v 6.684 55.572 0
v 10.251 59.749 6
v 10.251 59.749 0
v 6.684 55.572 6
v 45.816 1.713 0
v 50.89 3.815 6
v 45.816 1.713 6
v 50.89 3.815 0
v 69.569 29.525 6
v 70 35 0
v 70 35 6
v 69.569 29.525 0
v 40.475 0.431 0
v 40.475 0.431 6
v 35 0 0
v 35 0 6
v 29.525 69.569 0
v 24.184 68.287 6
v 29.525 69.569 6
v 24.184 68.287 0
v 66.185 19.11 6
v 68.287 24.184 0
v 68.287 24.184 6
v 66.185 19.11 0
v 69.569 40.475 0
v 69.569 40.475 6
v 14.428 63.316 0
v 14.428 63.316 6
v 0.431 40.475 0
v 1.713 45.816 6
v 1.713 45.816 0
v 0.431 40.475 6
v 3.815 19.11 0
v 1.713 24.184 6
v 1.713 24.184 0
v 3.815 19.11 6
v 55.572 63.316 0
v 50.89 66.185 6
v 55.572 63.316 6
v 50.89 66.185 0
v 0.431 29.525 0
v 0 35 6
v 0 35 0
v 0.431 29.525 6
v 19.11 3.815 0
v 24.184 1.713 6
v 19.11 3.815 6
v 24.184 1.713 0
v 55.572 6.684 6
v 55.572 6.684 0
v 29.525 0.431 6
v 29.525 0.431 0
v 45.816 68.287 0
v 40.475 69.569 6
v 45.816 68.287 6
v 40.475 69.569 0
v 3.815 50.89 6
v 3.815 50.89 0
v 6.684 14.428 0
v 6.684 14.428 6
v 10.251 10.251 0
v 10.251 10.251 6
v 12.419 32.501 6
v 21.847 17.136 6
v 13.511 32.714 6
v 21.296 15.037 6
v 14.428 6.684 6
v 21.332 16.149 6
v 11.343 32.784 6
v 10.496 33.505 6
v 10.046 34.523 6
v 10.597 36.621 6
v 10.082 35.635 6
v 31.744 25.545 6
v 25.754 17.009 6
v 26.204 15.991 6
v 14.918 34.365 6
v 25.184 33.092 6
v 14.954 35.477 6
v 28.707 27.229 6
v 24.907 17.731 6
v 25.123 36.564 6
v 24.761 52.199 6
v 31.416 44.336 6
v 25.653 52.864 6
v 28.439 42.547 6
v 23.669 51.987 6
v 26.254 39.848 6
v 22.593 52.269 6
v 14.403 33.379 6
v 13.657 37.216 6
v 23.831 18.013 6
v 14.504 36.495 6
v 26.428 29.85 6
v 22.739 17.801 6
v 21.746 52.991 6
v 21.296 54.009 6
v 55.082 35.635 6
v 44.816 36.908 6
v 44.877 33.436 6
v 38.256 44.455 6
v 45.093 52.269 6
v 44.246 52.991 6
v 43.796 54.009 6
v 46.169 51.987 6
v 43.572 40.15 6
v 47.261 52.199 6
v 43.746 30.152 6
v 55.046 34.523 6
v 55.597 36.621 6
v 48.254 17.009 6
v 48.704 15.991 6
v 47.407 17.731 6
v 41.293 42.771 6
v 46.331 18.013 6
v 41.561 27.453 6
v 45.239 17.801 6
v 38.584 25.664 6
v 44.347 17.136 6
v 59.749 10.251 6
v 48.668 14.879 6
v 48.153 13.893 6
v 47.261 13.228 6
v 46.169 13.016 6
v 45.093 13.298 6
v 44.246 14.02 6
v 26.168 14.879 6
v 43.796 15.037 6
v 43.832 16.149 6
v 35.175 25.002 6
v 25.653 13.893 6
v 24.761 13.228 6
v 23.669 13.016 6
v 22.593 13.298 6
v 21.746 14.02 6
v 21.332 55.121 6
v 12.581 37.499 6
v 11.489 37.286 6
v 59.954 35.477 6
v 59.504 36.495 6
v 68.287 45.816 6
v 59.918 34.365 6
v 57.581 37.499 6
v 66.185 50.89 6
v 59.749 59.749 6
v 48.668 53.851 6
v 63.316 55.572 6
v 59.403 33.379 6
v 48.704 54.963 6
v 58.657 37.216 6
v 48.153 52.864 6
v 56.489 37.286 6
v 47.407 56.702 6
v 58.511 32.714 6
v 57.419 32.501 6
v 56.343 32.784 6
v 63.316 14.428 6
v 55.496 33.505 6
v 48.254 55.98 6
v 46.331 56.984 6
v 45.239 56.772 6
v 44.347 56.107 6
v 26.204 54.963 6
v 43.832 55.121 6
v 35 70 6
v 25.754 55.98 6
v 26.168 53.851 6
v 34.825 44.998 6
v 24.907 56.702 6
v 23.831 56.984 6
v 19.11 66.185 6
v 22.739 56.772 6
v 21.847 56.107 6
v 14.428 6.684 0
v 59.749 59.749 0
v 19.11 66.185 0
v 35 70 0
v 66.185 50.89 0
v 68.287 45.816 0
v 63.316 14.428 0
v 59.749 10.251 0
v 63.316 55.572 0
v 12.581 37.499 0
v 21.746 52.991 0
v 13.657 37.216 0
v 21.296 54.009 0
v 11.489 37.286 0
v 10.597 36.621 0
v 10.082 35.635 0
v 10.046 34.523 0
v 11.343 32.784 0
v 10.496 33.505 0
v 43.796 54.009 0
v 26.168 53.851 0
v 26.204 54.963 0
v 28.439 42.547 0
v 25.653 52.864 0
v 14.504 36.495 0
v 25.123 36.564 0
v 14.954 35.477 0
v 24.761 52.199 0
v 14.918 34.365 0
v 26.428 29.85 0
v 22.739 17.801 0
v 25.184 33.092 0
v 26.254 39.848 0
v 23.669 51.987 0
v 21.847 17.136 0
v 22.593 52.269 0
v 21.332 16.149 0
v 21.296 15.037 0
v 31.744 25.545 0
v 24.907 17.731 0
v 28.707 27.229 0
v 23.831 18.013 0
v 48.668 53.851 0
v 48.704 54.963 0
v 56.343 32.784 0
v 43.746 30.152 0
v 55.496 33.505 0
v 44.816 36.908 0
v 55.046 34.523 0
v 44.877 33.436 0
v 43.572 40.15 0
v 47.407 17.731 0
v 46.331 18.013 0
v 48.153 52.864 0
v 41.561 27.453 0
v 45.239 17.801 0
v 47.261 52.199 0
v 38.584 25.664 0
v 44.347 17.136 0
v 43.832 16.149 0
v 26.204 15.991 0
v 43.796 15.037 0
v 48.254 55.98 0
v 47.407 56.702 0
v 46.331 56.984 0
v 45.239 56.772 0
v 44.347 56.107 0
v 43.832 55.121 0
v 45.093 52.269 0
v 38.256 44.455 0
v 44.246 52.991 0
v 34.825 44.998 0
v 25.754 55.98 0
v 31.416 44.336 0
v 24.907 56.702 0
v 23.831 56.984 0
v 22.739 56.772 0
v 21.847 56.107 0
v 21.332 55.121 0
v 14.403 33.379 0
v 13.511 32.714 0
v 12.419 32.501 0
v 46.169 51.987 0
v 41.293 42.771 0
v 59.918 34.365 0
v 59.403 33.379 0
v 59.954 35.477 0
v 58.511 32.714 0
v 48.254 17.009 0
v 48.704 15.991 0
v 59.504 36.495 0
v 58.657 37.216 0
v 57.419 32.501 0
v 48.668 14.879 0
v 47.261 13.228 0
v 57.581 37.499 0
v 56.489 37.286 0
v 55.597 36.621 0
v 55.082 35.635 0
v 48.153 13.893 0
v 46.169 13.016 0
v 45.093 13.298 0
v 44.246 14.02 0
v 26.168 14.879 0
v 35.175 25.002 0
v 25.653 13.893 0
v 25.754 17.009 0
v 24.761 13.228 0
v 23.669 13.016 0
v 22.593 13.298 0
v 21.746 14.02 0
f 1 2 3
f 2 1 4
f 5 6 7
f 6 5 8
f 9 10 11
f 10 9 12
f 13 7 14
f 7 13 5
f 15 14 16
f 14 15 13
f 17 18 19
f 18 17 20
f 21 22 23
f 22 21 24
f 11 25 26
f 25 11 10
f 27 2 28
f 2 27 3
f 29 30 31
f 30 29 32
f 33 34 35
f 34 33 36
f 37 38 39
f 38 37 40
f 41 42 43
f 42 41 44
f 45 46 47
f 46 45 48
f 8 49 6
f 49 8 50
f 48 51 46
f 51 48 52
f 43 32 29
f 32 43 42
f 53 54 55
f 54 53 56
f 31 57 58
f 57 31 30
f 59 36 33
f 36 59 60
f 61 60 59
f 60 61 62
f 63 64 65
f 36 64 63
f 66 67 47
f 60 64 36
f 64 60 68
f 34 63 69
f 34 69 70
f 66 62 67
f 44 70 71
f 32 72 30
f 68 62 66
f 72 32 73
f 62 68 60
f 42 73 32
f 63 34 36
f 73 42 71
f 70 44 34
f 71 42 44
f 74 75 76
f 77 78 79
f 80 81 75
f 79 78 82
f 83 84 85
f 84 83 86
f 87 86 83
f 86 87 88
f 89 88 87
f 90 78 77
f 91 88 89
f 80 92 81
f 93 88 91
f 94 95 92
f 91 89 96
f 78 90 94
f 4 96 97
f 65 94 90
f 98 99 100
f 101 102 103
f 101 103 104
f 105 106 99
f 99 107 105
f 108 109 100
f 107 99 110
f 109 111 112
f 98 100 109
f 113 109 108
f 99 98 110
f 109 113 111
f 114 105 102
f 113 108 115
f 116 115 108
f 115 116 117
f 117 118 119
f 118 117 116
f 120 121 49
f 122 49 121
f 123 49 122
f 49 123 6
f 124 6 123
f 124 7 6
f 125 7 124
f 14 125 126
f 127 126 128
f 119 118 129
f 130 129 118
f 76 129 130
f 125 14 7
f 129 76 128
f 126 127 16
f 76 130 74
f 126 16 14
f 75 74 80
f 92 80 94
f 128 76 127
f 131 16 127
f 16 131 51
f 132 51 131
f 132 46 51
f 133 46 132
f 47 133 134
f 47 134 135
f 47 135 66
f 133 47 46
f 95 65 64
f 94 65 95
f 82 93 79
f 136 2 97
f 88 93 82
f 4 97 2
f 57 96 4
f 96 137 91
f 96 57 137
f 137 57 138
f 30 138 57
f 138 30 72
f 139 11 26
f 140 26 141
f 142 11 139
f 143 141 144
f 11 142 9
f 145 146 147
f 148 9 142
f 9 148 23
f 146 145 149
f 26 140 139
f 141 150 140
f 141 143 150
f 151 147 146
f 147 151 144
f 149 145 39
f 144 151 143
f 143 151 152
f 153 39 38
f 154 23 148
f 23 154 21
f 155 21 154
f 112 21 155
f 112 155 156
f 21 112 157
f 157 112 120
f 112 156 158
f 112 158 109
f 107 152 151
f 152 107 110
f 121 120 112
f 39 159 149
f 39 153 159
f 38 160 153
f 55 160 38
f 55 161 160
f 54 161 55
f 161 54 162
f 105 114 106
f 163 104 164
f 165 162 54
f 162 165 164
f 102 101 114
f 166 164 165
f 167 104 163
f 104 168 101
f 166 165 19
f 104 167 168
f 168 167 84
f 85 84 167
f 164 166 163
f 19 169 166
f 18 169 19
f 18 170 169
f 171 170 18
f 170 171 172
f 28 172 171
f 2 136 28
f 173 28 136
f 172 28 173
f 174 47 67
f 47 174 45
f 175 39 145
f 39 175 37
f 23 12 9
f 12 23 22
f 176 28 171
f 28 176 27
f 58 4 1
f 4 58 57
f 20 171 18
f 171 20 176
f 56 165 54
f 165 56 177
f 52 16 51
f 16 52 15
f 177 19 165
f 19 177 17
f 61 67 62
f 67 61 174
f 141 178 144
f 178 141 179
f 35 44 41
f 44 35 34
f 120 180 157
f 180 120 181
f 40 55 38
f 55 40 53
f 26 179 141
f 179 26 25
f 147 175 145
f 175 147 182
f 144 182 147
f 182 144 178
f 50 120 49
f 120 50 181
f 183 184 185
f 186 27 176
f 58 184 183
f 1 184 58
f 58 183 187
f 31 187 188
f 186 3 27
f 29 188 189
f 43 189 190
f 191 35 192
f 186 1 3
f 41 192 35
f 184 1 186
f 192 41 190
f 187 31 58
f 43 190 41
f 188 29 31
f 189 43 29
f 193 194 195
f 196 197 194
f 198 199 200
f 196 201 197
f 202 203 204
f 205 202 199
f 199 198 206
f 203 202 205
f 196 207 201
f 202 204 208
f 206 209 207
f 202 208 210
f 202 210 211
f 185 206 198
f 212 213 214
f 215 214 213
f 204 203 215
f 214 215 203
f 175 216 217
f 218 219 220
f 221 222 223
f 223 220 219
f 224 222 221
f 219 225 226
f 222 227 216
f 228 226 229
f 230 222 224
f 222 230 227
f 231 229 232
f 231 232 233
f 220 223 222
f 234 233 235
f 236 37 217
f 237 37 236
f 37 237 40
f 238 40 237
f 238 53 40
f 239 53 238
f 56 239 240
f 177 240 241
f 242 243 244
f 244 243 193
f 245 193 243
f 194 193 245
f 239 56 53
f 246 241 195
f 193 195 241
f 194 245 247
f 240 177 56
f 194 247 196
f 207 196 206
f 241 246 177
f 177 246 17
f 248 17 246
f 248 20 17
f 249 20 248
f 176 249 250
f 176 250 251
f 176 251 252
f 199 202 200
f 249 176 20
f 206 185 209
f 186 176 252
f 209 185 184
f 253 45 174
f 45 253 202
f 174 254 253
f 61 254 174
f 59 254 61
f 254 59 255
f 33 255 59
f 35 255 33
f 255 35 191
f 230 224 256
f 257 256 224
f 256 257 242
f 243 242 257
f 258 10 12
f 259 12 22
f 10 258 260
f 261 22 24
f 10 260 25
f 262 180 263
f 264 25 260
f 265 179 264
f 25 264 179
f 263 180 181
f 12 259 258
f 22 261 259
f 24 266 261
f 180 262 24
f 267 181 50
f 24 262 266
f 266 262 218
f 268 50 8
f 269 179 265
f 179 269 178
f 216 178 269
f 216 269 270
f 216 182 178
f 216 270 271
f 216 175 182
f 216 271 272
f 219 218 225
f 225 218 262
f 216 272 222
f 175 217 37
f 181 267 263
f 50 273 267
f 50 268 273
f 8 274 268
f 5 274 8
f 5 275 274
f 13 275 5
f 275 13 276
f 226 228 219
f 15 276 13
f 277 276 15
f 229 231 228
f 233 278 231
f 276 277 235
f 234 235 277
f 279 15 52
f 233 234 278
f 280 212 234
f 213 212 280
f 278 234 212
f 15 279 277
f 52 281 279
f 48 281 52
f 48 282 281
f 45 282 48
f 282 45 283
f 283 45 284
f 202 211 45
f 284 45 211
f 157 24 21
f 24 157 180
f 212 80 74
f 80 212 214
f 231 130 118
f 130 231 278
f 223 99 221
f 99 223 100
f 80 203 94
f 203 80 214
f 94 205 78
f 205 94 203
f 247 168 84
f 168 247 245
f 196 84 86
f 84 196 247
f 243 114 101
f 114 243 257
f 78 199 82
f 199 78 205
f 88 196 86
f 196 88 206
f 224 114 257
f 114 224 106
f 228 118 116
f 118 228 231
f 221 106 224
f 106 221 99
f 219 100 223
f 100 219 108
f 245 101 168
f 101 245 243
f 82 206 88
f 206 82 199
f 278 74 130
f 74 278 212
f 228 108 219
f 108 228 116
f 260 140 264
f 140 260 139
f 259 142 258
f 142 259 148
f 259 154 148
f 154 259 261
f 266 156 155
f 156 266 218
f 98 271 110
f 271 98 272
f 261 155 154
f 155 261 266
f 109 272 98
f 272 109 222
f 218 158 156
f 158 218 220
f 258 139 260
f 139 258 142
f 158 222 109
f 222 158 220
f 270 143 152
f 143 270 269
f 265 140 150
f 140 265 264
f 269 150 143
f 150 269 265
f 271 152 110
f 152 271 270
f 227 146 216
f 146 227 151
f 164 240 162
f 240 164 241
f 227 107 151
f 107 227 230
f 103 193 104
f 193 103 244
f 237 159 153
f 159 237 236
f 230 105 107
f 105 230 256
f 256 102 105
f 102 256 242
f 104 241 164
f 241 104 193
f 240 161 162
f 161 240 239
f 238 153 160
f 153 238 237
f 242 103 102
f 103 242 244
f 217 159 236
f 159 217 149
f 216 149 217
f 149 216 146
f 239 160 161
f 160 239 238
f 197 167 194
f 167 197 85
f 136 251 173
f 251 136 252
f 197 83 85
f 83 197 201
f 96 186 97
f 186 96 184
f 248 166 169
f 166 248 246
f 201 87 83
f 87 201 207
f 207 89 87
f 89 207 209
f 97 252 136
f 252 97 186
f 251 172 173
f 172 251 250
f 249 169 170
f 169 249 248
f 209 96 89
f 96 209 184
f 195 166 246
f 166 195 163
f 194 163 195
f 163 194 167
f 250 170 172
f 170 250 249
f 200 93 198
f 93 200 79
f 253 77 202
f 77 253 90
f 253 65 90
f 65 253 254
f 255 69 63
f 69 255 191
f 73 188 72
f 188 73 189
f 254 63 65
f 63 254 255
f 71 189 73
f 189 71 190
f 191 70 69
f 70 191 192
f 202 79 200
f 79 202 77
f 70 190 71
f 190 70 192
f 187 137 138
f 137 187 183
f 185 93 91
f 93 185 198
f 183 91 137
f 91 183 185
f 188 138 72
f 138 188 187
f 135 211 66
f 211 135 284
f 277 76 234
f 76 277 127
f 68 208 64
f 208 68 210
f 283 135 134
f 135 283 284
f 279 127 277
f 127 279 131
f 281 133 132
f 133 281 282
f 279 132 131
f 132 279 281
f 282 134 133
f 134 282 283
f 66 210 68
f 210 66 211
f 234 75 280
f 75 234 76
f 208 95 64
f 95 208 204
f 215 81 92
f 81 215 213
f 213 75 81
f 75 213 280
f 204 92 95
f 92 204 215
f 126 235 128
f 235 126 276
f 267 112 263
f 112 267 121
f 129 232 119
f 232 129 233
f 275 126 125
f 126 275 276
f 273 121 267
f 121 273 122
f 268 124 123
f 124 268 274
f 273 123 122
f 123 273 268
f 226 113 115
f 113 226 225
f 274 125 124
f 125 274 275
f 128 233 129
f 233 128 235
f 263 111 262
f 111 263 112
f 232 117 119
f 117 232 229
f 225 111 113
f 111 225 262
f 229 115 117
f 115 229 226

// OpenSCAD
$fn = 32;

// ----------------------------------------------------------------------
// Spacer plate: round flange R35, 6 bolts
// ----------------------------------------------------------------------

// --- parameters (mm) ---
bore_r = 10;              // centre bore radius
bolt_r = 2.5;             // bolt hole radius
plate_t = 6;              // plate thickness, Z (extrusion height)
flange_r = 35;            // flange radius
n_bolt = 6;               // bolt hole count
ring_r = 22.5;            // bolt circle radius

profile = [[70, 35], [69.569, 40.475], [68.287, 45.816], [66.185, 50.89], [63.316, 55.572], [59.749, 59.749], [55.572, 63.316], [50.89, 66.185], [45.816, 68.287], [40.475, 69.569], [35, 70], [29.525, 69.569], [24.184, 68.287], [19.11, 66.185], [14.428, 63.316], [10.251, 59.749], [6.684, 55.572], [3.815, 50.89], [1.713, 45.816], [0.431, 40.475], [0, 35], [0.431, 29.525], [1.713, 24.184], [3.815, 19.11], [6.684, 14.428], [10.251, 10.251], [14.428, 6.684], [19.11, 3.815], [24.184, 1.713], [29.525, 0.431], [35, 0], [40.475, 0.431], [45.816, 1.713], [50.89, 3.815], [55.572, 6.684], [59.749, 10.251], [63.316, 14.428], [66.185, 19.11], [68.287, 24.184], [69.569, 29.525]];  // primary outline, 40 points, counter clockwise
void_1 = [[44.816, 36.908], [43.572, 40.15], [41.293, 42.771], [38.256, 44.455], [34.825, 44.998], [31.416, 44.336], [28.439, 42.547], [26.254, 39.848], [25.123, 36.564], [25.184, 33.092], [26.428, 29.85], [28.707, 27.229], [31.744, 25.545], [35.175, 25.002], [38.584, 25.664], [41.561, 27.453], [43.746, 30.152], [44.877, 33.436]];  // centre bore, 18 points
void_2 = [[59.954, 35.477], [59.504, 36.495], [58.657, 37.216], [57.581, 37.499], [56.489, 37.286], [55.597, 36.621], [55.082, 35.635], [55.046, 34.523], [55.496, 33.505], [56.343, 32.784], [57.419, 32.501], [58.511, 32.714], [59.403, 33.379], [59.918, 34.365]];  // bolt hole 1, 14 points
void_3 = [[48.704, 54.963], [48.254, 55.98], [47.407, 56.702], [46.331, 56.984], [45.239, 56.772], [44.347, 56.107], [43.832, 55.121], [43.796, 54.009], [44.246, 52.991], [45.093, 52.269], [46.169, 51.987], [47.261, 52.199], [48.153, 52.864], [48.668, 53.851]];  // bolt hole 2, 14 points
void_4 = [[26.204, 54.963], [25.754, 55.98], [24.907, 56.702], [23.831, 56.984], [22.739, 56.772], [21.847, 56.107], [21.332, 55.121], [21.296, 54.009], [21.746, 52.991], [22.593, 52.269], [23.669, 51.987], [24.761, 52.199], [25.653, 52.864], [26.168, 53.851]];  // bolt hole 3, 14 points
void_5 = [[14.954, 35.477], [14.504, 36.495], [13.657, 37.216], [12.581, 37.499], [11.489, 37.286], [10.597, 36.621], [10.082, 35.635], [10.046, 34.523], [10.496, 33.505], [11.343, 32.784], [12.419, 32.501], [13.511, 32.714], [14.403, 33.379], [14.918, 34.365]];  // bolt hole 4, 14 points
void_6 = [[26.204, 15.991], [25.754, 17.009], [24.907, 17.731], [23.831, 18.013], [22.739, 17.801], [21.847, 17.136], [21.332, 16.149], [21.296, 15.037], [21.746, 14.02], [22.593, 13.298], [23.669, 13.016], [24.761, 13.228], [25.653, 13.893], [26.168, 14.879]];  // bolt hole 5, 14 points
void_7 = [[48.704, 15.991], [48.254, 17.009], [47.407, 17.731], [46.331, 18.013], [45.239, 17.801], [44.347, 17.136], [43.832, 16.149], [43.796, 15.037], [44.246, 14.02], [45.093, 13.298], [46.169, 13.016], [47.261, 13.228], [48.153, 13.893], [48.668, 14.879]];  // bolt hole 6, 14 points

// --- the one profile operation ---
difference() {
  linear_extrude(height = plate_t) polygon(points = profile);
  translate([0, 0, -1])
    linear_extrude(height = plate_t + 2) polygon(points = void_1);
  translate([0, 0, -1])
    linear_extrude(height = plate_t + 2) polygon(points = void_2);
  translate([0, 0, -1])
    linear_extrude(height = plate_t + 2) polygon(points = void_3);
  translate([0, 0, -1])
    linear_extrude(height = plate_t + 2) polygon(points = void_4);
  translate([0, 0, -1])
    linear_extrude(height = plate_t + 2) polygon(points = void_5);
  translate([0, 0, -1])
    linear_extrude(height = plate_t + 2) polygon(points = void_6);
  translate([0, 0, -1])
    linear_extrude(height = plate_t + 2) polygon(points = void_7);
}
